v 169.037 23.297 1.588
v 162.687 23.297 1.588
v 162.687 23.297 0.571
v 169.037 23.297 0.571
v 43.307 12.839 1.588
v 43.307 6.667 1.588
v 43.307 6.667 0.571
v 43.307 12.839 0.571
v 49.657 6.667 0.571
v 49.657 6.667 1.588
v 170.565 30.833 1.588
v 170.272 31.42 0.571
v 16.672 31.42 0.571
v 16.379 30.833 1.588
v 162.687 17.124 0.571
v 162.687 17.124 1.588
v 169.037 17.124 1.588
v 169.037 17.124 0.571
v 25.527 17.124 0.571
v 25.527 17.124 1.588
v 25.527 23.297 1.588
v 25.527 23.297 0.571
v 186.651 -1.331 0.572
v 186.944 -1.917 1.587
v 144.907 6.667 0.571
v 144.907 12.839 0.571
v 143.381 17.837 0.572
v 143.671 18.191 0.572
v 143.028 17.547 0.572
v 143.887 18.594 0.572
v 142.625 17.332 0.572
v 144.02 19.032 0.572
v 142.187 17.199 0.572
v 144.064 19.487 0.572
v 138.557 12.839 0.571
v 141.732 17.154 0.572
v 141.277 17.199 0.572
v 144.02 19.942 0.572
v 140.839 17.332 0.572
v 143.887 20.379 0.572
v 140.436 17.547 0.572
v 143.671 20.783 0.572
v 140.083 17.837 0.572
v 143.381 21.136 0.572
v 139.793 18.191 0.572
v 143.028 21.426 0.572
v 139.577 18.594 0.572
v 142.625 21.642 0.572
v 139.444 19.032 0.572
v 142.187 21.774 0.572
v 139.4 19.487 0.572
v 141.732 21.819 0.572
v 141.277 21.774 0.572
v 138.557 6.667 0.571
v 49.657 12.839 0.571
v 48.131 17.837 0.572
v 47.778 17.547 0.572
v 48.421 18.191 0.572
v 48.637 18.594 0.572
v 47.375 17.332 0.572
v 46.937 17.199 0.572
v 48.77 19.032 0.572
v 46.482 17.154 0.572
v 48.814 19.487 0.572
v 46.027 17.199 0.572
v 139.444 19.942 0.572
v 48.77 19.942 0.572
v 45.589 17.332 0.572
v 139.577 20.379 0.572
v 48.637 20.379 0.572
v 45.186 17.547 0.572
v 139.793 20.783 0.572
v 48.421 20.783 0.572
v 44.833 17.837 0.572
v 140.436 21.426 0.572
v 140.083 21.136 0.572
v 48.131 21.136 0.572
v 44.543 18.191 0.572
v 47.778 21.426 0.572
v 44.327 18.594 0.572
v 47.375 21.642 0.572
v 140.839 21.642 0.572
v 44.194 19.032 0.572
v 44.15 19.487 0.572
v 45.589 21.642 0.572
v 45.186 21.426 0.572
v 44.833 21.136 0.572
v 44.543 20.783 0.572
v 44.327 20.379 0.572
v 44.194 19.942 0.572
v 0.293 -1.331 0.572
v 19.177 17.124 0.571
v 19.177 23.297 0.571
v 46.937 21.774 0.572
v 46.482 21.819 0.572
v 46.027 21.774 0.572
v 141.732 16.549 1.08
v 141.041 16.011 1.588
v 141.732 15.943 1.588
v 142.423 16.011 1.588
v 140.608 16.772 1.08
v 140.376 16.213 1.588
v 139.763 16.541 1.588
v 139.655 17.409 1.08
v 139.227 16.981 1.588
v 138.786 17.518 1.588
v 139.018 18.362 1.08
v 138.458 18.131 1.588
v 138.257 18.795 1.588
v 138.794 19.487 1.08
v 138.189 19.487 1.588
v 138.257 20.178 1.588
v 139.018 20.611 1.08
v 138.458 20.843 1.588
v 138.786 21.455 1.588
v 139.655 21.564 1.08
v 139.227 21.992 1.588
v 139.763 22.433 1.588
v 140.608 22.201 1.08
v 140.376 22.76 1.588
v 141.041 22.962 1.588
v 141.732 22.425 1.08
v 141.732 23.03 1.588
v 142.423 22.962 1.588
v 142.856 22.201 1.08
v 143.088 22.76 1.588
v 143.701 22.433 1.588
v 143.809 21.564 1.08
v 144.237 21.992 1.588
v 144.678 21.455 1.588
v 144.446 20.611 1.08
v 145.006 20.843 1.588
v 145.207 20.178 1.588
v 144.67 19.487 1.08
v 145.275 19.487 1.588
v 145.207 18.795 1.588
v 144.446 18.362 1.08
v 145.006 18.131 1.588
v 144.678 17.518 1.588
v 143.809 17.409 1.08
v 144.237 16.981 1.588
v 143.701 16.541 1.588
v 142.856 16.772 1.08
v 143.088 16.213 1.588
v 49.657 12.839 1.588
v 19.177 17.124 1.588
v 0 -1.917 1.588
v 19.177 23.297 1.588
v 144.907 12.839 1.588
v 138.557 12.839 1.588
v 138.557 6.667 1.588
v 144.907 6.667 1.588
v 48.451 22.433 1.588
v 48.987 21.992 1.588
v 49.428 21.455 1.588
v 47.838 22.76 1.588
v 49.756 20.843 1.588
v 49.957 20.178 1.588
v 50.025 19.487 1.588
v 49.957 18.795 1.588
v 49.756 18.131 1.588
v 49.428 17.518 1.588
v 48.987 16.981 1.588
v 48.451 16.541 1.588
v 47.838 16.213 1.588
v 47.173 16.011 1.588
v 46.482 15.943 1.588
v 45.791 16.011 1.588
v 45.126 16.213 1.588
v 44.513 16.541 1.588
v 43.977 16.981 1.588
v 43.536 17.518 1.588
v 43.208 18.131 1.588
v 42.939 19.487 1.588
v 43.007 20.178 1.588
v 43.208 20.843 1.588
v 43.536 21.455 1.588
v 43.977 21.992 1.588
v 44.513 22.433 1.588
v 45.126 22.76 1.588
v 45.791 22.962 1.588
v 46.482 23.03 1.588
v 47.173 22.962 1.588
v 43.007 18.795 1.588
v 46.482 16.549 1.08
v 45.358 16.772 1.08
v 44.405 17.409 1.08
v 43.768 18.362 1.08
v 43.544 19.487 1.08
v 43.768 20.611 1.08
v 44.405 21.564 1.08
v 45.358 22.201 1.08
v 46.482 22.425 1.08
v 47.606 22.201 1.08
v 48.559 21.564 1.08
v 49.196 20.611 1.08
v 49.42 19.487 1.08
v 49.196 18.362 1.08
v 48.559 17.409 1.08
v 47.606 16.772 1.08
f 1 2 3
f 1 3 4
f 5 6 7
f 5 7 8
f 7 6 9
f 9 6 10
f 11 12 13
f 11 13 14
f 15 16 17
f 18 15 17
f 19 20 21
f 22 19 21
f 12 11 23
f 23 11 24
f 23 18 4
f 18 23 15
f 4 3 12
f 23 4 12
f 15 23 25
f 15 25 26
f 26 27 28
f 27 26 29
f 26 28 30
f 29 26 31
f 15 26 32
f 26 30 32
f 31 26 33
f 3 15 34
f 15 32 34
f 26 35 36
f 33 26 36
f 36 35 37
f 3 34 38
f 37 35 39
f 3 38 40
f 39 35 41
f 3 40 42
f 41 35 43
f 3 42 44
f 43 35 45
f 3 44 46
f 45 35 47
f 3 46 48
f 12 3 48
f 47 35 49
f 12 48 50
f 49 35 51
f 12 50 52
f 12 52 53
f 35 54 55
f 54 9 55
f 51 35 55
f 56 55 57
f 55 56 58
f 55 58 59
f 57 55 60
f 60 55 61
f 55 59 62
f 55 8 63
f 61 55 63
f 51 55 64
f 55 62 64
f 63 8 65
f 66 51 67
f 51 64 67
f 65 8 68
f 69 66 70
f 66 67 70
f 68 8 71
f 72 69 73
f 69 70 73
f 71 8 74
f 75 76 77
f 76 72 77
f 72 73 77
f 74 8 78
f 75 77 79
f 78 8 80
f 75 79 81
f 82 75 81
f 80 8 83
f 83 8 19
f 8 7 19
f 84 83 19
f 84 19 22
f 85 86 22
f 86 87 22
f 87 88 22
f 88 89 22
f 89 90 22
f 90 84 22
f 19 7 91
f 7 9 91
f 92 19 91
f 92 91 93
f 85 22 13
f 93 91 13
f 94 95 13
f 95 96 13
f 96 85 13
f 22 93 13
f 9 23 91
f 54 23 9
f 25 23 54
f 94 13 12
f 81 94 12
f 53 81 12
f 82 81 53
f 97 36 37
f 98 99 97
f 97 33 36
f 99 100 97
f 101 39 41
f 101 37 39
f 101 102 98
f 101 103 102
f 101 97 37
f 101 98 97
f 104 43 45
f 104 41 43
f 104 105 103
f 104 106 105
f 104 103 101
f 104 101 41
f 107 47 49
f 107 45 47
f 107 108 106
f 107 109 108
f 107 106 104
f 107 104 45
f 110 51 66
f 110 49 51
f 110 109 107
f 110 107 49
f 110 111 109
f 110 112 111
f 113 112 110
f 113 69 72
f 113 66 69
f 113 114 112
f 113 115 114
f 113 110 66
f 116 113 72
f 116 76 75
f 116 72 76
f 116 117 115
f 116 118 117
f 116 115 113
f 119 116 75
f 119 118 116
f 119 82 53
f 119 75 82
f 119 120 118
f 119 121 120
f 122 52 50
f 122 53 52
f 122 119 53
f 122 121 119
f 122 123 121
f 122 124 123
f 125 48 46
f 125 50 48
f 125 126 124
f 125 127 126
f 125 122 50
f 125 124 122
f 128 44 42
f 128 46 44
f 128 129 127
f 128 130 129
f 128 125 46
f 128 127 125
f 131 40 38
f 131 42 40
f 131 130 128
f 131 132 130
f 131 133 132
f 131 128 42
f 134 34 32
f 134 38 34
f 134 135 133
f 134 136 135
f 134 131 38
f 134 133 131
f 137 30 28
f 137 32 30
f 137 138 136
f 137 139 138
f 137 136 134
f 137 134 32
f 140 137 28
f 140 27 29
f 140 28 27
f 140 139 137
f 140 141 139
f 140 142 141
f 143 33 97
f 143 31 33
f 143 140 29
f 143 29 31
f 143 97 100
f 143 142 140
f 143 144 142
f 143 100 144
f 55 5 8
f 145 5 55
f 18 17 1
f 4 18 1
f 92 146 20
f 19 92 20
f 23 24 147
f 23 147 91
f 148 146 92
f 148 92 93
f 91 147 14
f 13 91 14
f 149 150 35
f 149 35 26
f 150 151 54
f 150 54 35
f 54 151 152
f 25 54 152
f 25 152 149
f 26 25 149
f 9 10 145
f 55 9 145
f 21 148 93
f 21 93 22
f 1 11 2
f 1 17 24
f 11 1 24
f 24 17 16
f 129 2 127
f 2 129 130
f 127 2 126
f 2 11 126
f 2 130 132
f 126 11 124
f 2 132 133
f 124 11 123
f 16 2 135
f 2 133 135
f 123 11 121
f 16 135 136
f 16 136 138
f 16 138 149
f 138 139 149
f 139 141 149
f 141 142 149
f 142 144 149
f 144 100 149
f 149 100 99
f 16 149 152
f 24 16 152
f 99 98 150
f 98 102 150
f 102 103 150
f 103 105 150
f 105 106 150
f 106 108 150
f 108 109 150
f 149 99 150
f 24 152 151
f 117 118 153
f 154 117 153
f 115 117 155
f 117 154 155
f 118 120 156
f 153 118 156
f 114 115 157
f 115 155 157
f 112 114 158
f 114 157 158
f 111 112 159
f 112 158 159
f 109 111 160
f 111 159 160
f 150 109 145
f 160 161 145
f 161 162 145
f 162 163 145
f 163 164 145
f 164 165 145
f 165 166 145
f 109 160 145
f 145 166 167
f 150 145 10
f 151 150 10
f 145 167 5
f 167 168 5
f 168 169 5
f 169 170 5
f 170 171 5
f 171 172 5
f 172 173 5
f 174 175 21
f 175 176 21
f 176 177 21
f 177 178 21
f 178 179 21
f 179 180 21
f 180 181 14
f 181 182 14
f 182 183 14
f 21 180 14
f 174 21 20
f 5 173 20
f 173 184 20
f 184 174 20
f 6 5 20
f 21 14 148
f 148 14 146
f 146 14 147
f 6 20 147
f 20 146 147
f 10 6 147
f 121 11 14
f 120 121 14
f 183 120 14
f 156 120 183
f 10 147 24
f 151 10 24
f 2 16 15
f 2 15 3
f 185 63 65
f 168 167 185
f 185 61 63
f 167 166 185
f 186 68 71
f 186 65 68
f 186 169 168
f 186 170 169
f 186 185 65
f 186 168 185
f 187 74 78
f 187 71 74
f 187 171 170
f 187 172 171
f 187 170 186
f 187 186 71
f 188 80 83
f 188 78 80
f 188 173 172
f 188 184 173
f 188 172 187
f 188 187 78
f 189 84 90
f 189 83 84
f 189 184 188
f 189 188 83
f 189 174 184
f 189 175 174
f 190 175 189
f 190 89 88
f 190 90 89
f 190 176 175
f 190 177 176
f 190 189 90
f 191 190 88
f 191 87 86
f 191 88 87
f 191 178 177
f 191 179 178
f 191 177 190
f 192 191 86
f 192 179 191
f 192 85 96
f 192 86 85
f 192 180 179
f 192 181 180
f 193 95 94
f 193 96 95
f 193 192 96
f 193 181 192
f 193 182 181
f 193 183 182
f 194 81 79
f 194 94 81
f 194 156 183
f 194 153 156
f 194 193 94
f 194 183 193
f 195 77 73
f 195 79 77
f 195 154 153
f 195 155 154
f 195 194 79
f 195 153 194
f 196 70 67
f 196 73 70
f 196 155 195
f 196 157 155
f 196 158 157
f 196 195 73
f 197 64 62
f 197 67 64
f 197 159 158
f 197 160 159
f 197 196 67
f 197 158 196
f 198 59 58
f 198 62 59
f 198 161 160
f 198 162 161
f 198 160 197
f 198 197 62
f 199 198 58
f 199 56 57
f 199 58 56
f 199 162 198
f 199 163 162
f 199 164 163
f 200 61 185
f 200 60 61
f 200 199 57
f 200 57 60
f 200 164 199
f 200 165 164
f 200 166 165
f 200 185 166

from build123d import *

# Parameters (mm, degrees)
BOSS_EXTRUDE2_DEPTH                       = 186.944
CUT_EXTRUDE1_DEPTH                        = 190.568748947
SKETCH6_W                                 = 6.35
SKETCH6_H                                 = 6.1722
CUT_EXTRUDE3_DEPTH                        = 190.568748947
CSK_FOR_6_FLAT_HEAD_MACHINE_SCREW_2_COUNT = 2
CSK_FOR_6_FLAT_HEAD_MACHINE_SCREW_2_PITCH = 95.25


with BuildPart() as part:
    # Sketch3 → Boss-Extrude2 (new body)
    with BuildSketch(Plane(origin=(0, 0, 0), x_dir=(0, 0, -1), z_dir=(1, 0, 0))):
        Polygon((-0.5715, 31.420044321), (-1.5875, 30.833456448), (-1.5875, -1.917455679), (-0.5715, -1.330867805), align=None)
    extrude(amount=BOSS_EXTRUDE2_DEPTH)

    # Sketch5 → Cut-Extrude1 (cut, through all)
    with BuildSketch(Plane.XY.offset(1.5875)):
        Polygon((0, -1.917455679), (16.672349491, 31.420044321), (0, 31.420044321), align=None)
        Polygon((186.944, -1.917455679), (186.944, 31.420044321), (170.271650509, 31.420044321), align=None)
    extrude(amount=-CUT_EXTRUDE1_DEPTH, mode=Mode.SUBTRACT)

    # Sketch6 → Cut-Extrude3 (cut, through all)
    with BuildSketch(Plane.XY.offset(1.5875)):
        with Locations((22.352, 20.210554054)):
            Rectangle(SKETCH6_W, SKETCH6_H)
        with Locations((46.482, 9.753360379)):
            Rectangle(SKETCH6_W, SKETCH6_H)
        with Locations((141.732, 9.753360379)):
            Rectangle(SKETCH6_W, SKETCH6_H)
        with Locations((165.862, 20.210554054)):
            Rectangle(SKETCH6_W, SKETCH6_H)
    extrude(amount=-CUT_EXTRUDE3_DEPTH, mode=Mode.SUBTRACT)

    # Sketch7 → CSK for #6 Flat Head Machine Screw (100)1 (revolve, cut)
    with BuildSketch(Plane(origin=(46.482, 19.486654054, 1.5875), x_dir=(0, -1, 0), z_dir=(1, 0, 0))):
        Polygon((0, 0), (0, 1.016), (1.89865, 1.016), (1.89865, 1.380025208), (3.5433, 0), align=None)
    csk_for_6_flat_head_machine_screw_100 = revolve(axis=Axis((46.482, 19.486654054, 7.9375), (0, 0, -1)), mode=Mode.SUBTRACT)

    # CSK for _6 Flat Head Machine Screw _ 2: CSK for #6 Flat Head Machine Screw (100)1 ×2
    with Locations(*[(i * CSK_FOR_6_FLAT_HEAD_MACHINE_SCREW_2_PITCH, 0, 0) for i in range(1, CSK_FOR_6_FLAT_HEAD_MACHINE_SCREW_2_COUNT)]):
        add(csk_for_6_flat_head_machine_screw_100, mode=Mode.SUBTRACT)


solid = part.part
